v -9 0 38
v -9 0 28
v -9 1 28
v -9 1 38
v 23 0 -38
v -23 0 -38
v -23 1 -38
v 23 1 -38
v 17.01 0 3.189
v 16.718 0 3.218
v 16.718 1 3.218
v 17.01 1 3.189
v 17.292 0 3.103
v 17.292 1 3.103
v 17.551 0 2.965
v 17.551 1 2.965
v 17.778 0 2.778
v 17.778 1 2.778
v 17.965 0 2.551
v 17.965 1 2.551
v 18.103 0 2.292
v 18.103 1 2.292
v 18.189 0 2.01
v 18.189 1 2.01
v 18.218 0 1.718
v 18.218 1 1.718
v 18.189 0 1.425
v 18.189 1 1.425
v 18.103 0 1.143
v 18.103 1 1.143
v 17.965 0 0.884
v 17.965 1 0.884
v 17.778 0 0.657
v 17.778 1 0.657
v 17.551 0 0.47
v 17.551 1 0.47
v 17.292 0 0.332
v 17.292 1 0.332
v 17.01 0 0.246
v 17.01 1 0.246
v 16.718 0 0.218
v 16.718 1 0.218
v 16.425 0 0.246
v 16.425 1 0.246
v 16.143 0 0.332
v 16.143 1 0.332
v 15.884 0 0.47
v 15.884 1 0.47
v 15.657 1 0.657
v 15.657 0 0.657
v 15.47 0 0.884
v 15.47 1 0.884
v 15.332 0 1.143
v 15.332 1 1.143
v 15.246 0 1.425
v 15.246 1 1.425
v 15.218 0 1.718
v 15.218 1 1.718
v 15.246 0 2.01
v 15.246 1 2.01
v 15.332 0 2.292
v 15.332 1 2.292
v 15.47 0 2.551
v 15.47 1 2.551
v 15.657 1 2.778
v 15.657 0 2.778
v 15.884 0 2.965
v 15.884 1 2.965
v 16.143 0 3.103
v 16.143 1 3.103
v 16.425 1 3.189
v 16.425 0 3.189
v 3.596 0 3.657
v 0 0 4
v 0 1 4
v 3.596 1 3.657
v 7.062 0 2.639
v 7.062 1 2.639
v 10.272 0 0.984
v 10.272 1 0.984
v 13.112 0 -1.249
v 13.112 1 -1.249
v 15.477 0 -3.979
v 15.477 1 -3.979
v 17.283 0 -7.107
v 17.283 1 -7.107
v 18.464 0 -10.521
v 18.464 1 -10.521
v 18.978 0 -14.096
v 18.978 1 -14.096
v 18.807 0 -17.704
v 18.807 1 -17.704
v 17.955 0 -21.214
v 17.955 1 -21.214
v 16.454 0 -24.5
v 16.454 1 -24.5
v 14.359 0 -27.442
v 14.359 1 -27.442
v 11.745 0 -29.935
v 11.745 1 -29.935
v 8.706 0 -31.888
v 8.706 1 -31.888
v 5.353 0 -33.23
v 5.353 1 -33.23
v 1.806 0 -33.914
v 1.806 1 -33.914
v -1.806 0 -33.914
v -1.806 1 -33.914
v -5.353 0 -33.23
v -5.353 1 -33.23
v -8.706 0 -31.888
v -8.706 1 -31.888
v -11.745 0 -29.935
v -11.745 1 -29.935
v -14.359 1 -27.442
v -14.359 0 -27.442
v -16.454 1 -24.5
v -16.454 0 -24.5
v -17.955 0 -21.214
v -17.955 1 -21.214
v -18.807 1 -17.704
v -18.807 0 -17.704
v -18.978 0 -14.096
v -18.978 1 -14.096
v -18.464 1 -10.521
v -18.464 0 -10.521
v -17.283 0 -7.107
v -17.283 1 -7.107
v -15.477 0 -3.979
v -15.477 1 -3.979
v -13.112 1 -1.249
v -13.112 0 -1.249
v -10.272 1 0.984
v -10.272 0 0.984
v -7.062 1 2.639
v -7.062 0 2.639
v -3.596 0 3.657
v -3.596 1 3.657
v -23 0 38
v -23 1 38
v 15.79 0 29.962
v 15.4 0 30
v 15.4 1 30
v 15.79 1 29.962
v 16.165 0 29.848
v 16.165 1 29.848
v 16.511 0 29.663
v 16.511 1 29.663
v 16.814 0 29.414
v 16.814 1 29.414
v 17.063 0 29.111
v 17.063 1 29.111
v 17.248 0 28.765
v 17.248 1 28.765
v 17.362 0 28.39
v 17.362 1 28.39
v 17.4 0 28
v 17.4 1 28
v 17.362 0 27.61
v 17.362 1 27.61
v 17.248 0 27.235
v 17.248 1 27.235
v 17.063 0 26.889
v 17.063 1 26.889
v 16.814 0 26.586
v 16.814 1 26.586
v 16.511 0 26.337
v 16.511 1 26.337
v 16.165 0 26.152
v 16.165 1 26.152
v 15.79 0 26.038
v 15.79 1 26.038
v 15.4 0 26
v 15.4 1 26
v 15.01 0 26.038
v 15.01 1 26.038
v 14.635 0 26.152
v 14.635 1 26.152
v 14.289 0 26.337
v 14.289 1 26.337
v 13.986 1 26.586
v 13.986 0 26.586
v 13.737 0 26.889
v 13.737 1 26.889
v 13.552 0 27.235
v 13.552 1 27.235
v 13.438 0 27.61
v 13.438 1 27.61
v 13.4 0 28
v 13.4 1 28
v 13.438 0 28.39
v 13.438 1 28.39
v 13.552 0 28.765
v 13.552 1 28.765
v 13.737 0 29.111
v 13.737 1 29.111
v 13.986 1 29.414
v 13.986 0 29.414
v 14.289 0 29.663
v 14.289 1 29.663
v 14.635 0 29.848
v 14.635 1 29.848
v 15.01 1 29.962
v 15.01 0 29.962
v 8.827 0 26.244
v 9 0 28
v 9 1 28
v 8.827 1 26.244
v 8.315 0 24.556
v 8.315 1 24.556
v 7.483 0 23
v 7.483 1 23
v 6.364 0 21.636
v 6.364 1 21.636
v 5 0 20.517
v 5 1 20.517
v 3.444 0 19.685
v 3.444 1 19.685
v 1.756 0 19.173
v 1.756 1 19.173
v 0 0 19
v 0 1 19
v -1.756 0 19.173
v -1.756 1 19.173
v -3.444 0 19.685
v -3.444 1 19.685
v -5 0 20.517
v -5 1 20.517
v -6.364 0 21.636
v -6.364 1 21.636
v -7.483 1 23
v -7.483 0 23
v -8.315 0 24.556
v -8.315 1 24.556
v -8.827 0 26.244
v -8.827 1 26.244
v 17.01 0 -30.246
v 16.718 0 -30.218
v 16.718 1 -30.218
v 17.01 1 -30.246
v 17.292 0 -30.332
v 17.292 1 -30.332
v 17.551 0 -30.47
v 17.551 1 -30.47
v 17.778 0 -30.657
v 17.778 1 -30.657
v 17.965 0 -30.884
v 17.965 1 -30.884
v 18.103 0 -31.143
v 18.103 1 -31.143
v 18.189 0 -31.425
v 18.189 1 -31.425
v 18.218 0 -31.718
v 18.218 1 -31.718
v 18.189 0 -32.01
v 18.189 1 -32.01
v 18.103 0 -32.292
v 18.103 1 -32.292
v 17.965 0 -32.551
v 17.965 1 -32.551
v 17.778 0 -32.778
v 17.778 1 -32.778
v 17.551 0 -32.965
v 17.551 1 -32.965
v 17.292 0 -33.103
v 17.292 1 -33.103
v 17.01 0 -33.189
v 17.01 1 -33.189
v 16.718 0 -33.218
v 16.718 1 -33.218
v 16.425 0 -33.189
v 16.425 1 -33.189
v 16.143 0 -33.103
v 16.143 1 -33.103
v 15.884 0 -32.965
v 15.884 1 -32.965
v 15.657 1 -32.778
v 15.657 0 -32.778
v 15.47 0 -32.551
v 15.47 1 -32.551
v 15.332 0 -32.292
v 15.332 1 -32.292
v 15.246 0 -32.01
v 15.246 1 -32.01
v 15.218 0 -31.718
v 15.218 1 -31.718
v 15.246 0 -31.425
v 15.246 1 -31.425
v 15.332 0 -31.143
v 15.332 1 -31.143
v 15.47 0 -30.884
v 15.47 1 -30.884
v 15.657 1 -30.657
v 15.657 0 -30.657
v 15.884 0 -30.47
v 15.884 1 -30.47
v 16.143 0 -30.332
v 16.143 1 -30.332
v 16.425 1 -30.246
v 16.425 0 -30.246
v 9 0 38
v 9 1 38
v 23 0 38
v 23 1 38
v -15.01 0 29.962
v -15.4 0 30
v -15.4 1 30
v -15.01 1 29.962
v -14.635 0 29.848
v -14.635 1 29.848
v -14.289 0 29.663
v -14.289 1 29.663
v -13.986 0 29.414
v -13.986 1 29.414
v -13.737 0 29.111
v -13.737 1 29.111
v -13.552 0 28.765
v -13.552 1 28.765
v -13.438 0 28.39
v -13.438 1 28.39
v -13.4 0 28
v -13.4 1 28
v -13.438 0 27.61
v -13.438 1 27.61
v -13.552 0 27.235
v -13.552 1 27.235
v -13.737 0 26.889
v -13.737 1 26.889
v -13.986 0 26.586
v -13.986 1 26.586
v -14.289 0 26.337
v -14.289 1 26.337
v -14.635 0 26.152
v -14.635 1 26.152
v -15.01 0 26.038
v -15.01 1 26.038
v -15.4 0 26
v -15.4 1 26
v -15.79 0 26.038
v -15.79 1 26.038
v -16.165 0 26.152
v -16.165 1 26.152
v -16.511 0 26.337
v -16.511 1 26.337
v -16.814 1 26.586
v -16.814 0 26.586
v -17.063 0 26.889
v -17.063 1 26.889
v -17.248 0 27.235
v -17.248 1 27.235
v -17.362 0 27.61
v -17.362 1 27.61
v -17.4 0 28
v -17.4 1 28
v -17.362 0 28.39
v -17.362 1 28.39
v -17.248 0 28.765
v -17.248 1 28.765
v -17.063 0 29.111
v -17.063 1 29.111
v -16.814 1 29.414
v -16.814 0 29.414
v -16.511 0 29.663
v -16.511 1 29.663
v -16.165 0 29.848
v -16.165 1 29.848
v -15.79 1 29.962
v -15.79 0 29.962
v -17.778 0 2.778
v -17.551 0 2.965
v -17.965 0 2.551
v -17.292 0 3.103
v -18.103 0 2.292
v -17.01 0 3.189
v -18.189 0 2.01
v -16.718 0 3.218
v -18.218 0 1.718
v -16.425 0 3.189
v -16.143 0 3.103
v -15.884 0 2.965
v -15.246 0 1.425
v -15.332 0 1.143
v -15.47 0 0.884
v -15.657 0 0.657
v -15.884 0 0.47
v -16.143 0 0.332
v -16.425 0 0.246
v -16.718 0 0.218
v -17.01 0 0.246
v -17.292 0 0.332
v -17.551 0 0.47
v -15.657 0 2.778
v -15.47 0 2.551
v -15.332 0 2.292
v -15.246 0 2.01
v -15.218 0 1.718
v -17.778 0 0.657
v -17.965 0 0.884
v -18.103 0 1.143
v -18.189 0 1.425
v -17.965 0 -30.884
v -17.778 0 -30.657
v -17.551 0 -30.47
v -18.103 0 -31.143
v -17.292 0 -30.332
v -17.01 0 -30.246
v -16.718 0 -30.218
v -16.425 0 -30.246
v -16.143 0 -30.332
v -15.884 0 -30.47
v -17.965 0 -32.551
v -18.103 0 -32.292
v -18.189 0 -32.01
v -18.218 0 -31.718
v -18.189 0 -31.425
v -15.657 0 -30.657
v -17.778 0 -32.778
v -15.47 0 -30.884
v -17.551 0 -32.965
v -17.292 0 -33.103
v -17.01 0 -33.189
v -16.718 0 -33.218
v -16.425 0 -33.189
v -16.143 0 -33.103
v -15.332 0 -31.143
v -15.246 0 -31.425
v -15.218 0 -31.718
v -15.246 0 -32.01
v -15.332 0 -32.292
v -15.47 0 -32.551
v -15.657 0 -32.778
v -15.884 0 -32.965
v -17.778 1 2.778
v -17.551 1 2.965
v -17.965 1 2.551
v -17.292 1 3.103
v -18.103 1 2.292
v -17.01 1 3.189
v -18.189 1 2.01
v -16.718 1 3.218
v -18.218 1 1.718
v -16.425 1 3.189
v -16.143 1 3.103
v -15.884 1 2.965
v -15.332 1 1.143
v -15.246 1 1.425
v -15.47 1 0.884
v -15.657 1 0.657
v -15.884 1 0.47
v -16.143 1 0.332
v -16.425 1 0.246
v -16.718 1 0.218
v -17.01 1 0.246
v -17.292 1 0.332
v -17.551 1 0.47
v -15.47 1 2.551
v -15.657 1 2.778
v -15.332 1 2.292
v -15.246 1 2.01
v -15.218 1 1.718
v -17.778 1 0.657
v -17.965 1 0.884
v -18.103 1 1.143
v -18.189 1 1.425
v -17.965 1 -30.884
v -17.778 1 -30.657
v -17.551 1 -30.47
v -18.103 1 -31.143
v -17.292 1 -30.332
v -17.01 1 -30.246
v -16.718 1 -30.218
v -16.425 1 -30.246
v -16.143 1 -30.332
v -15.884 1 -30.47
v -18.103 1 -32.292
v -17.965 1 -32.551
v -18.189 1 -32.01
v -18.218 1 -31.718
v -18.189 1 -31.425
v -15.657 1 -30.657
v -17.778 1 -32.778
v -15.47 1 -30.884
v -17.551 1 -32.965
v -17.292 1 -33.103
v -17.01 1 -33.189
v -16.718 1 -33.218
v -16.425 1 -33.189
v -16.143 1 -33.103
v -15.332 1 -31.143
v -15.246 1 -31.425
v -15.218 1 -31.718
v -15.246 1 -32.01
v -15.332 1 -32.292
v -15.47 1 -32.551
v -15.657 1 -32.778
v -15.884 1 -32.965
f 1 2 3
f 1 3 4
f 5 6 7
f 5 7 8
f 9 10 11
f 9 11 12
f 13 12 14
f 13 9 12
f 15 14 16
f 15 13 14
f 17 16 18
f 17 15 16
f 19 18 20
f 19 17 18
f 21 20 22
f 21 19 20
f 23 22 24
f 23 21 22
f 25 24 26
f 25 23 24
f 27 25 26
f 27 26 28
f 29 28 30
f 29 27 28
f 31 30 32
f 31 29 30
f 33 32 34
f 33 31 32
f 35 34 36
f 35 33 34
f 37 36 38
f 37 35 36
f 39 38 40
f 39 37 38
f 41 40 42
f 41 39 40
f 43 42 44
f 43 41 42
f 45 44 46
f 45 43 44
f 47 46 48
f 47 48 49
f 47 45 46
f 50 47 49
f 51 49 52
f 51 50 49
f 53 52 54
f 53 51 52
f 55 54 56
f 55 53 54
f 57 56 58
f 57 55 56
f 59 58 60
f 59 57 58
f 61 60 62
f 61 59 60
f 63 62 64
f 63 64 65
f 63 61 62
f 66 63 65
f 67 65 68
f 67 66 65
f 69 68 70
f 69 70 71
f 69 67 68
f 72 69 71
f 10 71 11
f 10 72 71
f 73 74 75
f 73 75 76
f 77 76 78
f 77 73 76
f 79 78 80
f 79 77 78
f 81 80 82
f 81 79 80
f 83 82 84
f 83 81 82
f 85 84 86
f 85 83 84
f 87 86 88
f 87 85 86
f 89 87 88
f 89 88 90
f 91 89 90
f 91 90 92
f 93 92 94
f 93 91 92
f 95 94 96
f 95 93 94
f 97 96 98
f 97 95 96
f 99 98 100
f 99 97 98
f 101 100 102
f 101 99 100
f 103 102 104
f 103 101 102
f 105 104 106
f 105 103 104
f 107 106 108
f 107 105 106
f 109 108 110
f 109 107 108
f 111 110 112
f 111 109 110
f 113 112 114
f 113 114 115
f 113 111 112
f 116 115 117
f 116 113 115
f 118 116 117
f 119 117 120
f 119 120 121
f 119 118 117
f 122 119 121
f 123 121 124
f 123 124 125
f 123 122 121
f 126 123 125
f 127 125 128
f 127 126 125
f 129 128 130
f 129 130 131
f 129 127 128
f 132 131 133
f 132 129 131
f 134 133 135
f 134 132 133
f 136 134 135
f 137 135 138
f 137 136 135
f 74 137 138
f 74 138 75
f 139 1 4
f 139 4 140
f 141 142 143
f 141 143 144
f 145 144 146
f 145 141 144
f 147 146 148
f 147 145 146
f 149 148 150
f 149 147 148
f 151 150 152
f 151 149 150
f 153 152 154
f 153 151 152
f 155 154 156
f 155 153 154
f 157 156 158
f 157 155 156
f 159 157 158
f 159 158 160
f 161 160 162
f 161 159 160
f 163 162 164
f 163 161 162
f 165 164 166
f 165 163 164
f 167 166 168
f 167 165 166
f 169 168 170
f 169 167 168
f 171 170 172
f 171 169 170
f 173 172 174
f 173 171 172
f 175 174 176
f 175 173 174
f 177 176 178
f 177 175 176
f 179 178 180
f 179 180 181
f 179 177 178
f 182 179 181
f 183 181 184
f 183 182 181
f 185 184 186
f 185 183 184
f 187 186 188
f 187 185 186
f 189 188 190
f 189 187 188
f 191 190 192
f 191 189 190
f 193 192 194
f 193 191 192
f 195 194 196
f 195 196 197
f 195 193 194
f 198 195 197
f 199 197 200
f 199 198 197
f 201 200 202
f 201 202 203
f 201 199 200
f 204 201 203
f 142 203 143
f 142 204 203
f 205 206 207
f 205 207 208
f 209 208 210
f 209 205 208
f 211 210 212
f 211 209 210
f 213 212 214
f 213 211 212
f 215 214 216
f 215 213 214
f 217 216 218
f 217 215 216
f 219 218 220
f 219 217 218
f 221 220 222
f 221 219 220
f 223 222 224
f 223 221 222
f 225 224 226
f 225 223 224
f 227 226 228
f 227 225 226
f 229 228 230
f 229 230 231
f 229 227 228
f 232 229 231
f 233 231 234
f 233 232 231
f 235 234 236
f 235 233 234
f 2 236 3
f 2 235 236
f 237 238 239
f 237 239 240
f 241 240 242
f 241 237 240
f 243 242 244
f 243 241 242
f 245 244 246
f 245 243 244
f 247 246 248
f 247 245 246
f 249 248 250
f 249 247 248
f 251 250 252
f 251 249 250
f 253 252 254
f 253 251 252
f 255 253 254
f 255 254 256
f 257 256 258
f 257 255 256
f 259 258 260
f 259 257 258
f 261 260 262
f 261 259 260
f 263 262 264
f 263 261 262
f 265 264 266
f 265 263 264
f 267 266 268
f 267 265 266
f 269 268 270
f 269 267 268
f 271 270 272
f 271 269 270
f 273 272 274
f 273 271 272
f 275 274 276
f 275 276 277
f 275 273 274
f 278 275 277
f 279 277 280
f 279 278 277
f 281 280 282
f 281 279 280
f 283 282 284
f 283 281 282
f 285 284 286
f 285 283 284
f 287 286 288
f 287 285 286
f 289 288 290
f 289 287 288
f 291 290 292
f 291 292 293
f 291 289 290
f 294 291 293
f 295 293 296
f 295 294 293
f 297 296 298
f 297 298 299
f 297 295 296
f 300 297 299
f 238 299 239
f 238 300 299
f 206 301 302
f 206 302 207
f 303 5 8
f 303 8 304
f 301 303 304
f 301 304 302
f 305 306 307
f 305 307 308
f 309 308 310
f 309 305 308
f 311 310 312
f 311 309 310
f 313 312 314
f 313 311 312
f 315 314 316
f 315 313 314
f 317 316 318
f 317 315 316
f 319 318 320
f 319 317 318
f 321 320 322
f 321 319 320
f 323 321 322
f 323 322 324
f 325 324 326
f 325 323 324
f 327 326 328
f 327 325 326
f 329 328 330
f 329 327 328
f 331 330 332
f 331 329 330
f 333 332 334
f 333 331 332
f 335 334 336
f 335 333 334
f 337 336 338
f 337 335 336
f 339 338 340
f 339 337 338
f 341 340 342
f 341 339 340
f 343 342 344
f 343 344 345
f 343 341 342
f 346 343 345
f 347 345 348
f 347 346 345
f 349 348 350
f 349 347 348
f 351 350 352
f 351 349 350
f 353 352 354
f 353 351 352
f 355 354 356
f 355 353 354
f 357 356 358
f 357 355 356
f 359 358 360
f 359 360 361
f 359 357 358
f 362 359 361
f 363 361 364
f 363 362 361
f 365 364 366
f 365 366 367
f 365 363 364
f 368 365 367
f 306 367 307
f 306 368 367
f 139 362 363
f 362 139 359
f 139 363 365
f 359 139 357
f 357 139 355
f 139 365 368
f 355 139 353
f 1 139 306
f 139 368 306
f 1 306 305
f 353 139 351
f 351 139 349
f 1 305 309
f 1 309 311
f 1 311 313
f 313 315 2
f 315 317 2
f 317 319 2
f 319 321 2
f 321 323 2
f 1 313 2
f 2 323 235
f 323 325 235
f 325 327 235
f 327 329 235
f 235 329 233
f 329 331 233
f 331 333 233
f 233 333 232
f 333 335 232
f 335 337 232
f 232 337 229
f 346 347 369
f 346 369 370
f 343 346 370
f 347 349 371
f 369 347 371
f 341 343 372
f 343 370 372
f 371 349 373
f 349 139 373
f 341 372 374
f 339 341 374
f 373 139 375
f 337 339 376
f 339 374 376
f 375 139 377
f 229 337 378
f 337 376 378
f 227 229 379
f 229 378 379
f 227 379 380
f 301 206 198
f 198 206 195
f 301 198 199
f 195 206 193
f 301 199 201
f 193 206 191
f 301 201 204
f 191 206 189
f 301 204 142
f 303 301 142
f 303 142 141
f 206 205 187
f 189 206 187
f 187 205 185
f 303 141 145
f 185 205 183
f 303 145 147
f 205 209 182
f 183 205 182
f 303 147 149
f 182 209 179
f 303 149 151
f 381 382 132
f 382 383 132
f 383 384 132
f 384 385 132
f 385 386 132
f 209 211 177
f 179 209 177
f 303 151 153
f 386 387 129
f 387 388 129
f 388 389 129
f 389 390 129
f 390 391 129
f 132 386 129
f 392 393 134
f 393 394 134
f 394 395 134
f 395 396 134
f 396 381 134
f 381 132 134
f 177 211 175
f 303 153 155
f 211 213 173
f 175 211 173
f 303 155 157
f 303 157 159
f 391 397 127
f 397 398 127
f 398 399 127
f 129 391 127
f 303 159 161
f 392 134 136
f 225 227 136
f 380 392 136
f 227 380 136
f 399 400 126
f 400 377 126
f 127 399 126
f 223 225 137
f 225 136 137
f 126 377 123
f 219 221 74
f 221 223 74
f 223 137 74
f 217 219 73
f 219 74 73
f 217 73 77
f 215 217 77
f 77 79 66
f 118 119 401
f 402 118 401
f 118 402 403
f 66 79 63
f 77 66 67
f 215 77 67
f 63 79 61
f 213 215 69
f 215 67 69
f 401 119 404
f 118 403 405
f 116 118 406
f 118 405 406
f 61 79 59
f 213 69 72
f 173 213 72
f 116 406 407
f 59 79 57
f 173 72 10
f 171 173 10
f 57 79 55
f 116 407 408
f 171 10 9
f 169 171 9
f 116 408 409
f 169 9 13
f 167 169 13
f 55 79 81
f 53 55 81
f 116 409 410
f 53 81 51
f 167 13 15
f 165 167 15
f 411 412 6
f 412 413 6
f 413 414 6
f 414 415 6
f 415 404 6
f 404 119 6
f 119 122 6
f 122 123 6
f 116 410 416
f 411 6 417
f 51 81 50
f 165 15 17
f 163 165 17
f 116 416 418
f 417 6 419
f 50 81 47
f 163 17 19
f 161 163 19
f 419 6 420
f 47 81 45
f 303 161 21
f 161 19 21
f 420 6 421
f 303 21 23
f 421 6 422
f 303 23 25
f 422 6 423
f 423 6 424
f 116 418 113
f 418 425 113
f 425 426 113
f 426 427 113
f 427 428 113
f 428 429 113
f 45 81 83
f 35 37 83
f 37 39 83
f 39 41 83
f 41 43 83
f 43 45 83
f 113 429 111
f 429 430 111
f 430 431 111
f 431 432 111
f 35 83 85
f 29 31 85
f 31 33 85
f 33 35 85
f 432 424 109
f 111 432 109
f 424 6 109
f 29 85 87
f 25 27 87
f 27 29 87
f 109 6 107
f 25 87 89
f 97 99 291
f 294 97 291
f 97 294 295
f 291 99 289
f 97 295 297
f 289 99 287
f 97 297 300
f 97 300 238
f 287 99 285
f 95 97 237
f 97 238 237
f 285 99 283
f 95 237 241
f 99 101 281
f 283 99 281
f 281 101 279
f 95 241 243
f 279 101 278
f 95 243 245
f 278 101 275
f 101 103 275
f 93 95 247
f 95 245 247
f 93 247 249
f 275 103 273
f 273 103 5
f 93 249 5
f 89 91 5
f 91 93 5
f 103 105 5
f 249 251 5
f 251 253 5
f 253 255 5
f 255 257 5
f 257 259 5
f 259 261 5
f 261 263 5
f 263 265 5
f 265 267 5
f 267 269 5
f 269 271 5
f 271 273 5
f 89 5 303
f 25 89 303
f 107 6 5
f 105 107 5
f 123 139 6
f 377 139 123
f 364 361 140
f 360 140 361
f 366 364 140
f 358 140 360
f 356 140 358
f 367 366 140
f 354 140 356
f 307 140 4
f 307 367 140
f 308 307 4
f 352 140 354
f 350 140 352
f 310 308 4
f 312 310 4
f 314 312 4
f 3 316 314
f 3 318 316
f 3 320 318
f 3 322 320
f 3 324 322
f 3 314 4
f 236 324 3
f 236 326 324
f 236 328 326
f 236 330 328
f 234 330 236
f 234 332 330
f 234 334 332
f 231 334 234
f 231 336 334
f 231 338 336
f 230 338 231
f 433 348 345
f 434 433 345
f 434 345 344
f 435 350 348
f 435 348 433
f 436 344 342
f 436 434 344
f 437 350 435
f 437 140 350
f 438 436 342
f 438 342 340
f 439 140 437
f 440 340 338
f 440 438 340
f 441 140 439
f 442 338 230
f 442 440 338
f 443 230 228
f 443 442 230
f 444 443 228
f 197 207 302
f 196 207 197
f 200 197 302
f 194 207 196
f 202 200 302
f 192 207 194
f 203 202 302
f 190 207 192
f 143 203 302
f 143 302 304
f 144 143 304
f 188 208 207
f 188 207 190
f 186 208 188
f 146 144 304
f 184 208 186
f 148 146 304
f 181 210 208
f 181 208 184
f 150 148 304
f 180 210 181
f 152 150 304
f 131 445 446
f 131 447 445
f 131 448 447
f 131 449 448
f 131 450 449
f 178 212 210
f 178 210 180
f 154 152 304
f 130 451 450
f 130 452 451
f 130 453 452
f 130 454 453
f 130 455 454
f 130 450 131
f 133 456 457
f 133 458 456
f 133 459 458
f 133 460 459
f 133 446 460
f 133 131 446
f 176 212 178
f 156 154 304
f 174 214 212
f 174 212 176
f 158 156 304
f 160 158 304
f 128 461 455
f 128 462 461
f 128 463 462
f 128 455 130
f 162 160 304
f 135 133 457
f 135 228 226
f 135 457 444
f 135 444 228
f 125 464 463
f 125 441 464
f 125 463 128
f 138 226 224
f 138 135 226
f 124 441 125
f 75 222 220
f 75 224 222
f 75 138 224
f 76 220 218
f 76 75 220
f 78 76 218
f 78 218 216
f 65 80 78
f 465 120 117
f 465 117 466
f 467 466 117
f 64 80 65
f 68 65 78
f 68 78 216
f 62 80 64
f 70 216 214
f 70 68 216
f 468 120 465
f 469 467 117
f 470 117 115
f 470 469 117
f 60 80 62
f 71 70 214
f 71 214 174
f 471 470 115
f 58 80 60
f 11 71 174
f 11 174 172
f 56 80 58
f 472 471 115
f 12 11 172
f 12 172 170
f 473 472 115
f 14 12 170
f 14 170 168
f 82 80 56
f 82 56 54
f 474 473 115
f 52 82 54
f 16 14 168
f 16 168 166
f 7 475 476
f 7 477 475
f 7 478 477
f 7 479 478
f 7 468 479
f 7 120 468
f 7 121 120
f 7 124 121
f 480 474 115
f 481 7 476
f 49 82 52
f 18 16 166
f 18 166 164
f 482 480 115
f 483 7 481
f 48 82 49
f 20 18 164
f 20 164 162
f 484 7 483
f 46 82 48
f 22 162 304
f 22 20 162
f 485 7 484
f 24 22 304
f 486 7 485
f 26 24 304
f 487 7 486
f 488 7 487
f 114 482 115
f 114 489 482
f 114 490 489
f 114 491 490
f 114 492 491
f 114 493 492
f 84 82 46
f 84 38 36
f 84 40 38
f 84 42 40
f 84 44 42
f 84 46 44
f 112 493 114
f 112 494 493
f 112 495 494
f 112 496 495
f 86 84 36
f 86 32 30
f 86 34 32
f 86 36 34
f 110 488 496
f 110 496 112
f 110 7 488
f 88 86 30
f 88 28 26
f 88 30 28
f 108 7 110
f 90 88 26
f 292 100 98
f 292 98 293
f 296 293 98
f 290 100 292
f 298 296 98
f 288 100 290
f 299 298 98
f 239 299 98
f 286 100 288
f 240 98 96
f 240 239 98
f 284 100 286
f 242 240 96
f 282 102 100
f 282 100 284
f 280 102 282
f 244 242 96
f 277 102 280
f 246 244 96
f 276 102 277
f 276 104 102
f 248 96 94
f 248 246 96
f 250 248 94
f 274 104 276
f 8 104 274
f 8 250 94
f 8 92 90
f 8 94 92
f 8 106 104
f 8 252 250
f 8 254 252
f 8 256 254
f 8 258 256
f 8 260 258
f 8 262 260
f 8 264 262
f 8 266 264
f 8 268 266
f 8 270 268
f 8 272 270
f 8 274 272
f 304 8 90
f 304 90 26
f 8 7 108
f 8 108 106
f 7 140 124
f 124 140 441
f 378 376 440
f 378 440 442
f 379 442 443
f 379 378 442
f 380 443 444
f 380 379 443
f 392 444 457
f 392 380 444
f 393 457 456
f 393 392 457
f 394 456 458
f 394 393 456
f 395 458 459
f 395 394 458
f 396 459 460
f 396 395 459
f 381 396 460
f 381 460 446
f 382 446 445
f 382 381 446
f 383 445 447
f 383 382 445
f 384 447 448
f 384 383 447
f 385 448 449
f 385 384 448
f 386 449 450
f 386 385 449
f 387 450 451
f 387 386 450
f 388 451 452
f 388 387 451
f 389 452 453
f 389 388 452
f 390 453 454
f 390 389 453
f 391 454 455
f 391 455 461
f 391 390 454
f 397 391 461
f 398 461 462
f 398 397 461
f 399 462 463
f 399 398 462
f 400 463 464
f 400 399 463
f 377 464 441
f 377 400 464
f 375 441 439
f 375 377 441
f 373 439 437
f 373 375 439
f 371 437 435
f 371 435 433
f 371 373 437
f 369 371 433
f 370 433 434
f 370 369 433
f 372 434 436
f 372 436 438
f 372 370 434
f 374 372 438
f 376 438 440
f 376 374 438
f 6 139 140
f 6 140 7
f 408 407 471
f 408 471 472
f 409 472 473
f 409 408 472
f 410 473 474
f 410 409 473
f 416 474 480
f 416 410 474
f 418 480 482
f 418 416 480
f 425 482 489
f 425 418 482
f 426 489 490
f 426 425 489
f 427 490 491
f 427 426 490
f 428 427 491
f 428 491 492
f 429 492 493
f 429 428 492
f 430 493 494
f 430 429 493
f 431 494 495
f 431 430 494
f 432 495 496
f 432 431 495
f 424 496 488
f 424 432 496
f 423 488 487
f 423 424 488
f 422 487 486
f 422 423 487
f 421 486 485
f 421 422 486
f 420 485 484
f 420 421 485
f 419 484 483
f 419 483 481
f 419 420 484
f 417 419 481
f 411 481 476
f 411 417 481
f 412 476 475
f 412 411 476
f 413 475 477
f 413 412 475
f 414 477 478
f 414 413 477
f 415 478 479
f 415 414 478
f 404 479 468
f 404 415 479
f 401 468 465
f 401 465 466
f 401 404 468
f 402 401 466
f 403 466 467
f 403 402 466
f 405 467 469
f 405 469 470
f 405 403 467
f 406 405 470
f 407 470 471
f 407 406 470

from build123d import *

# Parameters (mm, degrees)
SKETCH_1_R      = 2
SKETCH_1_W      = 40
SKETCH_1_H      = 40
SKETCH_1_R_2    = 1.5
SKETCH_1_R_3    = 19
EXTRUDE_1_DEPTH = 1


with BuildPart() as part:
    # Эскиз1 → Бобышка-Вытянуть1 (new body)
    # profile 1 of 2: a face of its own
    with BuildSketch(Plane(origin=(0, 0, 0), x_dir=(1, 0, 0), z_dir=(0, 1, 0))):
        with BuildLine():
            Line((-9, -28), (-9, -38))
            Line((-9, -38), (-23, -38))
            Line((-23, -38), (-23, 38))
            Line((-23, 38), (23, 38))
            Line((23, 38), (23, -38))
            Line((23, -38), (9, -38))
            Line((9, -38), (9, -28))
            ThreePointArc((9, -28), (0, -19), (-9, -28))
        make_face()
        with Locations(Location((15.4, -28, 0), (0, 0, 270))):
            Circle(SKETCH_1_R, mode=Mode.SUBTRACT)
        with Locations(Location((-15.4, -28, 0), (0, 0, 270))):
            Circle(SKETCH_1_R, mode=Mode.SUBTRACT)
        with Locations((0, 15)):
            Rectangle(SKETCH_1_W, SKETCH_1_H, mode=Mode.SUBTRACT)
    # profile 2 of 2: a face of its own
    with BuildSketch(Plane(origin=(0, 0, 0), x_dir=(1, 0, 0), z_dir=(0, 1, 0))):
        with Locations((0, 15)):
            Rectangle(SKETCH_1_W, SKETCH_1_H)
        with Locations(Location((-16.717514421, -1.717514421, 0), (0, 0, 270))):
            Circle(SKETCH_1_R_2, mode=Mode.SUBTRACT)
        with Locations(Location((16.717514421, -1.717514421, 0), (0, 0, 270))):
            Circle(SKETCH_1_R_2, mode=Mode.SUBTRACT)
        with Locations(Location((16.717514421, 31.717514421, 0), (0, 0, 270))):
            Circle(SKETCH_1_R_2, mode=Mode.SUBTRACT)
        with Locations(Location((-16.717514421, 31.717514421, 0), (0, 0, 270))):
            Circle(SKETCH_1_R_2, mode=Mode.SUBTRACT)
        with Locations(Location((0, 15, 0), (0, 0, 270))):
            Circle(SKETCH_1_R_3, mode=Mode.SUBTRACT)
    extrude(amount=EXTRUDE_1_DEPTH)


solid = part.part
